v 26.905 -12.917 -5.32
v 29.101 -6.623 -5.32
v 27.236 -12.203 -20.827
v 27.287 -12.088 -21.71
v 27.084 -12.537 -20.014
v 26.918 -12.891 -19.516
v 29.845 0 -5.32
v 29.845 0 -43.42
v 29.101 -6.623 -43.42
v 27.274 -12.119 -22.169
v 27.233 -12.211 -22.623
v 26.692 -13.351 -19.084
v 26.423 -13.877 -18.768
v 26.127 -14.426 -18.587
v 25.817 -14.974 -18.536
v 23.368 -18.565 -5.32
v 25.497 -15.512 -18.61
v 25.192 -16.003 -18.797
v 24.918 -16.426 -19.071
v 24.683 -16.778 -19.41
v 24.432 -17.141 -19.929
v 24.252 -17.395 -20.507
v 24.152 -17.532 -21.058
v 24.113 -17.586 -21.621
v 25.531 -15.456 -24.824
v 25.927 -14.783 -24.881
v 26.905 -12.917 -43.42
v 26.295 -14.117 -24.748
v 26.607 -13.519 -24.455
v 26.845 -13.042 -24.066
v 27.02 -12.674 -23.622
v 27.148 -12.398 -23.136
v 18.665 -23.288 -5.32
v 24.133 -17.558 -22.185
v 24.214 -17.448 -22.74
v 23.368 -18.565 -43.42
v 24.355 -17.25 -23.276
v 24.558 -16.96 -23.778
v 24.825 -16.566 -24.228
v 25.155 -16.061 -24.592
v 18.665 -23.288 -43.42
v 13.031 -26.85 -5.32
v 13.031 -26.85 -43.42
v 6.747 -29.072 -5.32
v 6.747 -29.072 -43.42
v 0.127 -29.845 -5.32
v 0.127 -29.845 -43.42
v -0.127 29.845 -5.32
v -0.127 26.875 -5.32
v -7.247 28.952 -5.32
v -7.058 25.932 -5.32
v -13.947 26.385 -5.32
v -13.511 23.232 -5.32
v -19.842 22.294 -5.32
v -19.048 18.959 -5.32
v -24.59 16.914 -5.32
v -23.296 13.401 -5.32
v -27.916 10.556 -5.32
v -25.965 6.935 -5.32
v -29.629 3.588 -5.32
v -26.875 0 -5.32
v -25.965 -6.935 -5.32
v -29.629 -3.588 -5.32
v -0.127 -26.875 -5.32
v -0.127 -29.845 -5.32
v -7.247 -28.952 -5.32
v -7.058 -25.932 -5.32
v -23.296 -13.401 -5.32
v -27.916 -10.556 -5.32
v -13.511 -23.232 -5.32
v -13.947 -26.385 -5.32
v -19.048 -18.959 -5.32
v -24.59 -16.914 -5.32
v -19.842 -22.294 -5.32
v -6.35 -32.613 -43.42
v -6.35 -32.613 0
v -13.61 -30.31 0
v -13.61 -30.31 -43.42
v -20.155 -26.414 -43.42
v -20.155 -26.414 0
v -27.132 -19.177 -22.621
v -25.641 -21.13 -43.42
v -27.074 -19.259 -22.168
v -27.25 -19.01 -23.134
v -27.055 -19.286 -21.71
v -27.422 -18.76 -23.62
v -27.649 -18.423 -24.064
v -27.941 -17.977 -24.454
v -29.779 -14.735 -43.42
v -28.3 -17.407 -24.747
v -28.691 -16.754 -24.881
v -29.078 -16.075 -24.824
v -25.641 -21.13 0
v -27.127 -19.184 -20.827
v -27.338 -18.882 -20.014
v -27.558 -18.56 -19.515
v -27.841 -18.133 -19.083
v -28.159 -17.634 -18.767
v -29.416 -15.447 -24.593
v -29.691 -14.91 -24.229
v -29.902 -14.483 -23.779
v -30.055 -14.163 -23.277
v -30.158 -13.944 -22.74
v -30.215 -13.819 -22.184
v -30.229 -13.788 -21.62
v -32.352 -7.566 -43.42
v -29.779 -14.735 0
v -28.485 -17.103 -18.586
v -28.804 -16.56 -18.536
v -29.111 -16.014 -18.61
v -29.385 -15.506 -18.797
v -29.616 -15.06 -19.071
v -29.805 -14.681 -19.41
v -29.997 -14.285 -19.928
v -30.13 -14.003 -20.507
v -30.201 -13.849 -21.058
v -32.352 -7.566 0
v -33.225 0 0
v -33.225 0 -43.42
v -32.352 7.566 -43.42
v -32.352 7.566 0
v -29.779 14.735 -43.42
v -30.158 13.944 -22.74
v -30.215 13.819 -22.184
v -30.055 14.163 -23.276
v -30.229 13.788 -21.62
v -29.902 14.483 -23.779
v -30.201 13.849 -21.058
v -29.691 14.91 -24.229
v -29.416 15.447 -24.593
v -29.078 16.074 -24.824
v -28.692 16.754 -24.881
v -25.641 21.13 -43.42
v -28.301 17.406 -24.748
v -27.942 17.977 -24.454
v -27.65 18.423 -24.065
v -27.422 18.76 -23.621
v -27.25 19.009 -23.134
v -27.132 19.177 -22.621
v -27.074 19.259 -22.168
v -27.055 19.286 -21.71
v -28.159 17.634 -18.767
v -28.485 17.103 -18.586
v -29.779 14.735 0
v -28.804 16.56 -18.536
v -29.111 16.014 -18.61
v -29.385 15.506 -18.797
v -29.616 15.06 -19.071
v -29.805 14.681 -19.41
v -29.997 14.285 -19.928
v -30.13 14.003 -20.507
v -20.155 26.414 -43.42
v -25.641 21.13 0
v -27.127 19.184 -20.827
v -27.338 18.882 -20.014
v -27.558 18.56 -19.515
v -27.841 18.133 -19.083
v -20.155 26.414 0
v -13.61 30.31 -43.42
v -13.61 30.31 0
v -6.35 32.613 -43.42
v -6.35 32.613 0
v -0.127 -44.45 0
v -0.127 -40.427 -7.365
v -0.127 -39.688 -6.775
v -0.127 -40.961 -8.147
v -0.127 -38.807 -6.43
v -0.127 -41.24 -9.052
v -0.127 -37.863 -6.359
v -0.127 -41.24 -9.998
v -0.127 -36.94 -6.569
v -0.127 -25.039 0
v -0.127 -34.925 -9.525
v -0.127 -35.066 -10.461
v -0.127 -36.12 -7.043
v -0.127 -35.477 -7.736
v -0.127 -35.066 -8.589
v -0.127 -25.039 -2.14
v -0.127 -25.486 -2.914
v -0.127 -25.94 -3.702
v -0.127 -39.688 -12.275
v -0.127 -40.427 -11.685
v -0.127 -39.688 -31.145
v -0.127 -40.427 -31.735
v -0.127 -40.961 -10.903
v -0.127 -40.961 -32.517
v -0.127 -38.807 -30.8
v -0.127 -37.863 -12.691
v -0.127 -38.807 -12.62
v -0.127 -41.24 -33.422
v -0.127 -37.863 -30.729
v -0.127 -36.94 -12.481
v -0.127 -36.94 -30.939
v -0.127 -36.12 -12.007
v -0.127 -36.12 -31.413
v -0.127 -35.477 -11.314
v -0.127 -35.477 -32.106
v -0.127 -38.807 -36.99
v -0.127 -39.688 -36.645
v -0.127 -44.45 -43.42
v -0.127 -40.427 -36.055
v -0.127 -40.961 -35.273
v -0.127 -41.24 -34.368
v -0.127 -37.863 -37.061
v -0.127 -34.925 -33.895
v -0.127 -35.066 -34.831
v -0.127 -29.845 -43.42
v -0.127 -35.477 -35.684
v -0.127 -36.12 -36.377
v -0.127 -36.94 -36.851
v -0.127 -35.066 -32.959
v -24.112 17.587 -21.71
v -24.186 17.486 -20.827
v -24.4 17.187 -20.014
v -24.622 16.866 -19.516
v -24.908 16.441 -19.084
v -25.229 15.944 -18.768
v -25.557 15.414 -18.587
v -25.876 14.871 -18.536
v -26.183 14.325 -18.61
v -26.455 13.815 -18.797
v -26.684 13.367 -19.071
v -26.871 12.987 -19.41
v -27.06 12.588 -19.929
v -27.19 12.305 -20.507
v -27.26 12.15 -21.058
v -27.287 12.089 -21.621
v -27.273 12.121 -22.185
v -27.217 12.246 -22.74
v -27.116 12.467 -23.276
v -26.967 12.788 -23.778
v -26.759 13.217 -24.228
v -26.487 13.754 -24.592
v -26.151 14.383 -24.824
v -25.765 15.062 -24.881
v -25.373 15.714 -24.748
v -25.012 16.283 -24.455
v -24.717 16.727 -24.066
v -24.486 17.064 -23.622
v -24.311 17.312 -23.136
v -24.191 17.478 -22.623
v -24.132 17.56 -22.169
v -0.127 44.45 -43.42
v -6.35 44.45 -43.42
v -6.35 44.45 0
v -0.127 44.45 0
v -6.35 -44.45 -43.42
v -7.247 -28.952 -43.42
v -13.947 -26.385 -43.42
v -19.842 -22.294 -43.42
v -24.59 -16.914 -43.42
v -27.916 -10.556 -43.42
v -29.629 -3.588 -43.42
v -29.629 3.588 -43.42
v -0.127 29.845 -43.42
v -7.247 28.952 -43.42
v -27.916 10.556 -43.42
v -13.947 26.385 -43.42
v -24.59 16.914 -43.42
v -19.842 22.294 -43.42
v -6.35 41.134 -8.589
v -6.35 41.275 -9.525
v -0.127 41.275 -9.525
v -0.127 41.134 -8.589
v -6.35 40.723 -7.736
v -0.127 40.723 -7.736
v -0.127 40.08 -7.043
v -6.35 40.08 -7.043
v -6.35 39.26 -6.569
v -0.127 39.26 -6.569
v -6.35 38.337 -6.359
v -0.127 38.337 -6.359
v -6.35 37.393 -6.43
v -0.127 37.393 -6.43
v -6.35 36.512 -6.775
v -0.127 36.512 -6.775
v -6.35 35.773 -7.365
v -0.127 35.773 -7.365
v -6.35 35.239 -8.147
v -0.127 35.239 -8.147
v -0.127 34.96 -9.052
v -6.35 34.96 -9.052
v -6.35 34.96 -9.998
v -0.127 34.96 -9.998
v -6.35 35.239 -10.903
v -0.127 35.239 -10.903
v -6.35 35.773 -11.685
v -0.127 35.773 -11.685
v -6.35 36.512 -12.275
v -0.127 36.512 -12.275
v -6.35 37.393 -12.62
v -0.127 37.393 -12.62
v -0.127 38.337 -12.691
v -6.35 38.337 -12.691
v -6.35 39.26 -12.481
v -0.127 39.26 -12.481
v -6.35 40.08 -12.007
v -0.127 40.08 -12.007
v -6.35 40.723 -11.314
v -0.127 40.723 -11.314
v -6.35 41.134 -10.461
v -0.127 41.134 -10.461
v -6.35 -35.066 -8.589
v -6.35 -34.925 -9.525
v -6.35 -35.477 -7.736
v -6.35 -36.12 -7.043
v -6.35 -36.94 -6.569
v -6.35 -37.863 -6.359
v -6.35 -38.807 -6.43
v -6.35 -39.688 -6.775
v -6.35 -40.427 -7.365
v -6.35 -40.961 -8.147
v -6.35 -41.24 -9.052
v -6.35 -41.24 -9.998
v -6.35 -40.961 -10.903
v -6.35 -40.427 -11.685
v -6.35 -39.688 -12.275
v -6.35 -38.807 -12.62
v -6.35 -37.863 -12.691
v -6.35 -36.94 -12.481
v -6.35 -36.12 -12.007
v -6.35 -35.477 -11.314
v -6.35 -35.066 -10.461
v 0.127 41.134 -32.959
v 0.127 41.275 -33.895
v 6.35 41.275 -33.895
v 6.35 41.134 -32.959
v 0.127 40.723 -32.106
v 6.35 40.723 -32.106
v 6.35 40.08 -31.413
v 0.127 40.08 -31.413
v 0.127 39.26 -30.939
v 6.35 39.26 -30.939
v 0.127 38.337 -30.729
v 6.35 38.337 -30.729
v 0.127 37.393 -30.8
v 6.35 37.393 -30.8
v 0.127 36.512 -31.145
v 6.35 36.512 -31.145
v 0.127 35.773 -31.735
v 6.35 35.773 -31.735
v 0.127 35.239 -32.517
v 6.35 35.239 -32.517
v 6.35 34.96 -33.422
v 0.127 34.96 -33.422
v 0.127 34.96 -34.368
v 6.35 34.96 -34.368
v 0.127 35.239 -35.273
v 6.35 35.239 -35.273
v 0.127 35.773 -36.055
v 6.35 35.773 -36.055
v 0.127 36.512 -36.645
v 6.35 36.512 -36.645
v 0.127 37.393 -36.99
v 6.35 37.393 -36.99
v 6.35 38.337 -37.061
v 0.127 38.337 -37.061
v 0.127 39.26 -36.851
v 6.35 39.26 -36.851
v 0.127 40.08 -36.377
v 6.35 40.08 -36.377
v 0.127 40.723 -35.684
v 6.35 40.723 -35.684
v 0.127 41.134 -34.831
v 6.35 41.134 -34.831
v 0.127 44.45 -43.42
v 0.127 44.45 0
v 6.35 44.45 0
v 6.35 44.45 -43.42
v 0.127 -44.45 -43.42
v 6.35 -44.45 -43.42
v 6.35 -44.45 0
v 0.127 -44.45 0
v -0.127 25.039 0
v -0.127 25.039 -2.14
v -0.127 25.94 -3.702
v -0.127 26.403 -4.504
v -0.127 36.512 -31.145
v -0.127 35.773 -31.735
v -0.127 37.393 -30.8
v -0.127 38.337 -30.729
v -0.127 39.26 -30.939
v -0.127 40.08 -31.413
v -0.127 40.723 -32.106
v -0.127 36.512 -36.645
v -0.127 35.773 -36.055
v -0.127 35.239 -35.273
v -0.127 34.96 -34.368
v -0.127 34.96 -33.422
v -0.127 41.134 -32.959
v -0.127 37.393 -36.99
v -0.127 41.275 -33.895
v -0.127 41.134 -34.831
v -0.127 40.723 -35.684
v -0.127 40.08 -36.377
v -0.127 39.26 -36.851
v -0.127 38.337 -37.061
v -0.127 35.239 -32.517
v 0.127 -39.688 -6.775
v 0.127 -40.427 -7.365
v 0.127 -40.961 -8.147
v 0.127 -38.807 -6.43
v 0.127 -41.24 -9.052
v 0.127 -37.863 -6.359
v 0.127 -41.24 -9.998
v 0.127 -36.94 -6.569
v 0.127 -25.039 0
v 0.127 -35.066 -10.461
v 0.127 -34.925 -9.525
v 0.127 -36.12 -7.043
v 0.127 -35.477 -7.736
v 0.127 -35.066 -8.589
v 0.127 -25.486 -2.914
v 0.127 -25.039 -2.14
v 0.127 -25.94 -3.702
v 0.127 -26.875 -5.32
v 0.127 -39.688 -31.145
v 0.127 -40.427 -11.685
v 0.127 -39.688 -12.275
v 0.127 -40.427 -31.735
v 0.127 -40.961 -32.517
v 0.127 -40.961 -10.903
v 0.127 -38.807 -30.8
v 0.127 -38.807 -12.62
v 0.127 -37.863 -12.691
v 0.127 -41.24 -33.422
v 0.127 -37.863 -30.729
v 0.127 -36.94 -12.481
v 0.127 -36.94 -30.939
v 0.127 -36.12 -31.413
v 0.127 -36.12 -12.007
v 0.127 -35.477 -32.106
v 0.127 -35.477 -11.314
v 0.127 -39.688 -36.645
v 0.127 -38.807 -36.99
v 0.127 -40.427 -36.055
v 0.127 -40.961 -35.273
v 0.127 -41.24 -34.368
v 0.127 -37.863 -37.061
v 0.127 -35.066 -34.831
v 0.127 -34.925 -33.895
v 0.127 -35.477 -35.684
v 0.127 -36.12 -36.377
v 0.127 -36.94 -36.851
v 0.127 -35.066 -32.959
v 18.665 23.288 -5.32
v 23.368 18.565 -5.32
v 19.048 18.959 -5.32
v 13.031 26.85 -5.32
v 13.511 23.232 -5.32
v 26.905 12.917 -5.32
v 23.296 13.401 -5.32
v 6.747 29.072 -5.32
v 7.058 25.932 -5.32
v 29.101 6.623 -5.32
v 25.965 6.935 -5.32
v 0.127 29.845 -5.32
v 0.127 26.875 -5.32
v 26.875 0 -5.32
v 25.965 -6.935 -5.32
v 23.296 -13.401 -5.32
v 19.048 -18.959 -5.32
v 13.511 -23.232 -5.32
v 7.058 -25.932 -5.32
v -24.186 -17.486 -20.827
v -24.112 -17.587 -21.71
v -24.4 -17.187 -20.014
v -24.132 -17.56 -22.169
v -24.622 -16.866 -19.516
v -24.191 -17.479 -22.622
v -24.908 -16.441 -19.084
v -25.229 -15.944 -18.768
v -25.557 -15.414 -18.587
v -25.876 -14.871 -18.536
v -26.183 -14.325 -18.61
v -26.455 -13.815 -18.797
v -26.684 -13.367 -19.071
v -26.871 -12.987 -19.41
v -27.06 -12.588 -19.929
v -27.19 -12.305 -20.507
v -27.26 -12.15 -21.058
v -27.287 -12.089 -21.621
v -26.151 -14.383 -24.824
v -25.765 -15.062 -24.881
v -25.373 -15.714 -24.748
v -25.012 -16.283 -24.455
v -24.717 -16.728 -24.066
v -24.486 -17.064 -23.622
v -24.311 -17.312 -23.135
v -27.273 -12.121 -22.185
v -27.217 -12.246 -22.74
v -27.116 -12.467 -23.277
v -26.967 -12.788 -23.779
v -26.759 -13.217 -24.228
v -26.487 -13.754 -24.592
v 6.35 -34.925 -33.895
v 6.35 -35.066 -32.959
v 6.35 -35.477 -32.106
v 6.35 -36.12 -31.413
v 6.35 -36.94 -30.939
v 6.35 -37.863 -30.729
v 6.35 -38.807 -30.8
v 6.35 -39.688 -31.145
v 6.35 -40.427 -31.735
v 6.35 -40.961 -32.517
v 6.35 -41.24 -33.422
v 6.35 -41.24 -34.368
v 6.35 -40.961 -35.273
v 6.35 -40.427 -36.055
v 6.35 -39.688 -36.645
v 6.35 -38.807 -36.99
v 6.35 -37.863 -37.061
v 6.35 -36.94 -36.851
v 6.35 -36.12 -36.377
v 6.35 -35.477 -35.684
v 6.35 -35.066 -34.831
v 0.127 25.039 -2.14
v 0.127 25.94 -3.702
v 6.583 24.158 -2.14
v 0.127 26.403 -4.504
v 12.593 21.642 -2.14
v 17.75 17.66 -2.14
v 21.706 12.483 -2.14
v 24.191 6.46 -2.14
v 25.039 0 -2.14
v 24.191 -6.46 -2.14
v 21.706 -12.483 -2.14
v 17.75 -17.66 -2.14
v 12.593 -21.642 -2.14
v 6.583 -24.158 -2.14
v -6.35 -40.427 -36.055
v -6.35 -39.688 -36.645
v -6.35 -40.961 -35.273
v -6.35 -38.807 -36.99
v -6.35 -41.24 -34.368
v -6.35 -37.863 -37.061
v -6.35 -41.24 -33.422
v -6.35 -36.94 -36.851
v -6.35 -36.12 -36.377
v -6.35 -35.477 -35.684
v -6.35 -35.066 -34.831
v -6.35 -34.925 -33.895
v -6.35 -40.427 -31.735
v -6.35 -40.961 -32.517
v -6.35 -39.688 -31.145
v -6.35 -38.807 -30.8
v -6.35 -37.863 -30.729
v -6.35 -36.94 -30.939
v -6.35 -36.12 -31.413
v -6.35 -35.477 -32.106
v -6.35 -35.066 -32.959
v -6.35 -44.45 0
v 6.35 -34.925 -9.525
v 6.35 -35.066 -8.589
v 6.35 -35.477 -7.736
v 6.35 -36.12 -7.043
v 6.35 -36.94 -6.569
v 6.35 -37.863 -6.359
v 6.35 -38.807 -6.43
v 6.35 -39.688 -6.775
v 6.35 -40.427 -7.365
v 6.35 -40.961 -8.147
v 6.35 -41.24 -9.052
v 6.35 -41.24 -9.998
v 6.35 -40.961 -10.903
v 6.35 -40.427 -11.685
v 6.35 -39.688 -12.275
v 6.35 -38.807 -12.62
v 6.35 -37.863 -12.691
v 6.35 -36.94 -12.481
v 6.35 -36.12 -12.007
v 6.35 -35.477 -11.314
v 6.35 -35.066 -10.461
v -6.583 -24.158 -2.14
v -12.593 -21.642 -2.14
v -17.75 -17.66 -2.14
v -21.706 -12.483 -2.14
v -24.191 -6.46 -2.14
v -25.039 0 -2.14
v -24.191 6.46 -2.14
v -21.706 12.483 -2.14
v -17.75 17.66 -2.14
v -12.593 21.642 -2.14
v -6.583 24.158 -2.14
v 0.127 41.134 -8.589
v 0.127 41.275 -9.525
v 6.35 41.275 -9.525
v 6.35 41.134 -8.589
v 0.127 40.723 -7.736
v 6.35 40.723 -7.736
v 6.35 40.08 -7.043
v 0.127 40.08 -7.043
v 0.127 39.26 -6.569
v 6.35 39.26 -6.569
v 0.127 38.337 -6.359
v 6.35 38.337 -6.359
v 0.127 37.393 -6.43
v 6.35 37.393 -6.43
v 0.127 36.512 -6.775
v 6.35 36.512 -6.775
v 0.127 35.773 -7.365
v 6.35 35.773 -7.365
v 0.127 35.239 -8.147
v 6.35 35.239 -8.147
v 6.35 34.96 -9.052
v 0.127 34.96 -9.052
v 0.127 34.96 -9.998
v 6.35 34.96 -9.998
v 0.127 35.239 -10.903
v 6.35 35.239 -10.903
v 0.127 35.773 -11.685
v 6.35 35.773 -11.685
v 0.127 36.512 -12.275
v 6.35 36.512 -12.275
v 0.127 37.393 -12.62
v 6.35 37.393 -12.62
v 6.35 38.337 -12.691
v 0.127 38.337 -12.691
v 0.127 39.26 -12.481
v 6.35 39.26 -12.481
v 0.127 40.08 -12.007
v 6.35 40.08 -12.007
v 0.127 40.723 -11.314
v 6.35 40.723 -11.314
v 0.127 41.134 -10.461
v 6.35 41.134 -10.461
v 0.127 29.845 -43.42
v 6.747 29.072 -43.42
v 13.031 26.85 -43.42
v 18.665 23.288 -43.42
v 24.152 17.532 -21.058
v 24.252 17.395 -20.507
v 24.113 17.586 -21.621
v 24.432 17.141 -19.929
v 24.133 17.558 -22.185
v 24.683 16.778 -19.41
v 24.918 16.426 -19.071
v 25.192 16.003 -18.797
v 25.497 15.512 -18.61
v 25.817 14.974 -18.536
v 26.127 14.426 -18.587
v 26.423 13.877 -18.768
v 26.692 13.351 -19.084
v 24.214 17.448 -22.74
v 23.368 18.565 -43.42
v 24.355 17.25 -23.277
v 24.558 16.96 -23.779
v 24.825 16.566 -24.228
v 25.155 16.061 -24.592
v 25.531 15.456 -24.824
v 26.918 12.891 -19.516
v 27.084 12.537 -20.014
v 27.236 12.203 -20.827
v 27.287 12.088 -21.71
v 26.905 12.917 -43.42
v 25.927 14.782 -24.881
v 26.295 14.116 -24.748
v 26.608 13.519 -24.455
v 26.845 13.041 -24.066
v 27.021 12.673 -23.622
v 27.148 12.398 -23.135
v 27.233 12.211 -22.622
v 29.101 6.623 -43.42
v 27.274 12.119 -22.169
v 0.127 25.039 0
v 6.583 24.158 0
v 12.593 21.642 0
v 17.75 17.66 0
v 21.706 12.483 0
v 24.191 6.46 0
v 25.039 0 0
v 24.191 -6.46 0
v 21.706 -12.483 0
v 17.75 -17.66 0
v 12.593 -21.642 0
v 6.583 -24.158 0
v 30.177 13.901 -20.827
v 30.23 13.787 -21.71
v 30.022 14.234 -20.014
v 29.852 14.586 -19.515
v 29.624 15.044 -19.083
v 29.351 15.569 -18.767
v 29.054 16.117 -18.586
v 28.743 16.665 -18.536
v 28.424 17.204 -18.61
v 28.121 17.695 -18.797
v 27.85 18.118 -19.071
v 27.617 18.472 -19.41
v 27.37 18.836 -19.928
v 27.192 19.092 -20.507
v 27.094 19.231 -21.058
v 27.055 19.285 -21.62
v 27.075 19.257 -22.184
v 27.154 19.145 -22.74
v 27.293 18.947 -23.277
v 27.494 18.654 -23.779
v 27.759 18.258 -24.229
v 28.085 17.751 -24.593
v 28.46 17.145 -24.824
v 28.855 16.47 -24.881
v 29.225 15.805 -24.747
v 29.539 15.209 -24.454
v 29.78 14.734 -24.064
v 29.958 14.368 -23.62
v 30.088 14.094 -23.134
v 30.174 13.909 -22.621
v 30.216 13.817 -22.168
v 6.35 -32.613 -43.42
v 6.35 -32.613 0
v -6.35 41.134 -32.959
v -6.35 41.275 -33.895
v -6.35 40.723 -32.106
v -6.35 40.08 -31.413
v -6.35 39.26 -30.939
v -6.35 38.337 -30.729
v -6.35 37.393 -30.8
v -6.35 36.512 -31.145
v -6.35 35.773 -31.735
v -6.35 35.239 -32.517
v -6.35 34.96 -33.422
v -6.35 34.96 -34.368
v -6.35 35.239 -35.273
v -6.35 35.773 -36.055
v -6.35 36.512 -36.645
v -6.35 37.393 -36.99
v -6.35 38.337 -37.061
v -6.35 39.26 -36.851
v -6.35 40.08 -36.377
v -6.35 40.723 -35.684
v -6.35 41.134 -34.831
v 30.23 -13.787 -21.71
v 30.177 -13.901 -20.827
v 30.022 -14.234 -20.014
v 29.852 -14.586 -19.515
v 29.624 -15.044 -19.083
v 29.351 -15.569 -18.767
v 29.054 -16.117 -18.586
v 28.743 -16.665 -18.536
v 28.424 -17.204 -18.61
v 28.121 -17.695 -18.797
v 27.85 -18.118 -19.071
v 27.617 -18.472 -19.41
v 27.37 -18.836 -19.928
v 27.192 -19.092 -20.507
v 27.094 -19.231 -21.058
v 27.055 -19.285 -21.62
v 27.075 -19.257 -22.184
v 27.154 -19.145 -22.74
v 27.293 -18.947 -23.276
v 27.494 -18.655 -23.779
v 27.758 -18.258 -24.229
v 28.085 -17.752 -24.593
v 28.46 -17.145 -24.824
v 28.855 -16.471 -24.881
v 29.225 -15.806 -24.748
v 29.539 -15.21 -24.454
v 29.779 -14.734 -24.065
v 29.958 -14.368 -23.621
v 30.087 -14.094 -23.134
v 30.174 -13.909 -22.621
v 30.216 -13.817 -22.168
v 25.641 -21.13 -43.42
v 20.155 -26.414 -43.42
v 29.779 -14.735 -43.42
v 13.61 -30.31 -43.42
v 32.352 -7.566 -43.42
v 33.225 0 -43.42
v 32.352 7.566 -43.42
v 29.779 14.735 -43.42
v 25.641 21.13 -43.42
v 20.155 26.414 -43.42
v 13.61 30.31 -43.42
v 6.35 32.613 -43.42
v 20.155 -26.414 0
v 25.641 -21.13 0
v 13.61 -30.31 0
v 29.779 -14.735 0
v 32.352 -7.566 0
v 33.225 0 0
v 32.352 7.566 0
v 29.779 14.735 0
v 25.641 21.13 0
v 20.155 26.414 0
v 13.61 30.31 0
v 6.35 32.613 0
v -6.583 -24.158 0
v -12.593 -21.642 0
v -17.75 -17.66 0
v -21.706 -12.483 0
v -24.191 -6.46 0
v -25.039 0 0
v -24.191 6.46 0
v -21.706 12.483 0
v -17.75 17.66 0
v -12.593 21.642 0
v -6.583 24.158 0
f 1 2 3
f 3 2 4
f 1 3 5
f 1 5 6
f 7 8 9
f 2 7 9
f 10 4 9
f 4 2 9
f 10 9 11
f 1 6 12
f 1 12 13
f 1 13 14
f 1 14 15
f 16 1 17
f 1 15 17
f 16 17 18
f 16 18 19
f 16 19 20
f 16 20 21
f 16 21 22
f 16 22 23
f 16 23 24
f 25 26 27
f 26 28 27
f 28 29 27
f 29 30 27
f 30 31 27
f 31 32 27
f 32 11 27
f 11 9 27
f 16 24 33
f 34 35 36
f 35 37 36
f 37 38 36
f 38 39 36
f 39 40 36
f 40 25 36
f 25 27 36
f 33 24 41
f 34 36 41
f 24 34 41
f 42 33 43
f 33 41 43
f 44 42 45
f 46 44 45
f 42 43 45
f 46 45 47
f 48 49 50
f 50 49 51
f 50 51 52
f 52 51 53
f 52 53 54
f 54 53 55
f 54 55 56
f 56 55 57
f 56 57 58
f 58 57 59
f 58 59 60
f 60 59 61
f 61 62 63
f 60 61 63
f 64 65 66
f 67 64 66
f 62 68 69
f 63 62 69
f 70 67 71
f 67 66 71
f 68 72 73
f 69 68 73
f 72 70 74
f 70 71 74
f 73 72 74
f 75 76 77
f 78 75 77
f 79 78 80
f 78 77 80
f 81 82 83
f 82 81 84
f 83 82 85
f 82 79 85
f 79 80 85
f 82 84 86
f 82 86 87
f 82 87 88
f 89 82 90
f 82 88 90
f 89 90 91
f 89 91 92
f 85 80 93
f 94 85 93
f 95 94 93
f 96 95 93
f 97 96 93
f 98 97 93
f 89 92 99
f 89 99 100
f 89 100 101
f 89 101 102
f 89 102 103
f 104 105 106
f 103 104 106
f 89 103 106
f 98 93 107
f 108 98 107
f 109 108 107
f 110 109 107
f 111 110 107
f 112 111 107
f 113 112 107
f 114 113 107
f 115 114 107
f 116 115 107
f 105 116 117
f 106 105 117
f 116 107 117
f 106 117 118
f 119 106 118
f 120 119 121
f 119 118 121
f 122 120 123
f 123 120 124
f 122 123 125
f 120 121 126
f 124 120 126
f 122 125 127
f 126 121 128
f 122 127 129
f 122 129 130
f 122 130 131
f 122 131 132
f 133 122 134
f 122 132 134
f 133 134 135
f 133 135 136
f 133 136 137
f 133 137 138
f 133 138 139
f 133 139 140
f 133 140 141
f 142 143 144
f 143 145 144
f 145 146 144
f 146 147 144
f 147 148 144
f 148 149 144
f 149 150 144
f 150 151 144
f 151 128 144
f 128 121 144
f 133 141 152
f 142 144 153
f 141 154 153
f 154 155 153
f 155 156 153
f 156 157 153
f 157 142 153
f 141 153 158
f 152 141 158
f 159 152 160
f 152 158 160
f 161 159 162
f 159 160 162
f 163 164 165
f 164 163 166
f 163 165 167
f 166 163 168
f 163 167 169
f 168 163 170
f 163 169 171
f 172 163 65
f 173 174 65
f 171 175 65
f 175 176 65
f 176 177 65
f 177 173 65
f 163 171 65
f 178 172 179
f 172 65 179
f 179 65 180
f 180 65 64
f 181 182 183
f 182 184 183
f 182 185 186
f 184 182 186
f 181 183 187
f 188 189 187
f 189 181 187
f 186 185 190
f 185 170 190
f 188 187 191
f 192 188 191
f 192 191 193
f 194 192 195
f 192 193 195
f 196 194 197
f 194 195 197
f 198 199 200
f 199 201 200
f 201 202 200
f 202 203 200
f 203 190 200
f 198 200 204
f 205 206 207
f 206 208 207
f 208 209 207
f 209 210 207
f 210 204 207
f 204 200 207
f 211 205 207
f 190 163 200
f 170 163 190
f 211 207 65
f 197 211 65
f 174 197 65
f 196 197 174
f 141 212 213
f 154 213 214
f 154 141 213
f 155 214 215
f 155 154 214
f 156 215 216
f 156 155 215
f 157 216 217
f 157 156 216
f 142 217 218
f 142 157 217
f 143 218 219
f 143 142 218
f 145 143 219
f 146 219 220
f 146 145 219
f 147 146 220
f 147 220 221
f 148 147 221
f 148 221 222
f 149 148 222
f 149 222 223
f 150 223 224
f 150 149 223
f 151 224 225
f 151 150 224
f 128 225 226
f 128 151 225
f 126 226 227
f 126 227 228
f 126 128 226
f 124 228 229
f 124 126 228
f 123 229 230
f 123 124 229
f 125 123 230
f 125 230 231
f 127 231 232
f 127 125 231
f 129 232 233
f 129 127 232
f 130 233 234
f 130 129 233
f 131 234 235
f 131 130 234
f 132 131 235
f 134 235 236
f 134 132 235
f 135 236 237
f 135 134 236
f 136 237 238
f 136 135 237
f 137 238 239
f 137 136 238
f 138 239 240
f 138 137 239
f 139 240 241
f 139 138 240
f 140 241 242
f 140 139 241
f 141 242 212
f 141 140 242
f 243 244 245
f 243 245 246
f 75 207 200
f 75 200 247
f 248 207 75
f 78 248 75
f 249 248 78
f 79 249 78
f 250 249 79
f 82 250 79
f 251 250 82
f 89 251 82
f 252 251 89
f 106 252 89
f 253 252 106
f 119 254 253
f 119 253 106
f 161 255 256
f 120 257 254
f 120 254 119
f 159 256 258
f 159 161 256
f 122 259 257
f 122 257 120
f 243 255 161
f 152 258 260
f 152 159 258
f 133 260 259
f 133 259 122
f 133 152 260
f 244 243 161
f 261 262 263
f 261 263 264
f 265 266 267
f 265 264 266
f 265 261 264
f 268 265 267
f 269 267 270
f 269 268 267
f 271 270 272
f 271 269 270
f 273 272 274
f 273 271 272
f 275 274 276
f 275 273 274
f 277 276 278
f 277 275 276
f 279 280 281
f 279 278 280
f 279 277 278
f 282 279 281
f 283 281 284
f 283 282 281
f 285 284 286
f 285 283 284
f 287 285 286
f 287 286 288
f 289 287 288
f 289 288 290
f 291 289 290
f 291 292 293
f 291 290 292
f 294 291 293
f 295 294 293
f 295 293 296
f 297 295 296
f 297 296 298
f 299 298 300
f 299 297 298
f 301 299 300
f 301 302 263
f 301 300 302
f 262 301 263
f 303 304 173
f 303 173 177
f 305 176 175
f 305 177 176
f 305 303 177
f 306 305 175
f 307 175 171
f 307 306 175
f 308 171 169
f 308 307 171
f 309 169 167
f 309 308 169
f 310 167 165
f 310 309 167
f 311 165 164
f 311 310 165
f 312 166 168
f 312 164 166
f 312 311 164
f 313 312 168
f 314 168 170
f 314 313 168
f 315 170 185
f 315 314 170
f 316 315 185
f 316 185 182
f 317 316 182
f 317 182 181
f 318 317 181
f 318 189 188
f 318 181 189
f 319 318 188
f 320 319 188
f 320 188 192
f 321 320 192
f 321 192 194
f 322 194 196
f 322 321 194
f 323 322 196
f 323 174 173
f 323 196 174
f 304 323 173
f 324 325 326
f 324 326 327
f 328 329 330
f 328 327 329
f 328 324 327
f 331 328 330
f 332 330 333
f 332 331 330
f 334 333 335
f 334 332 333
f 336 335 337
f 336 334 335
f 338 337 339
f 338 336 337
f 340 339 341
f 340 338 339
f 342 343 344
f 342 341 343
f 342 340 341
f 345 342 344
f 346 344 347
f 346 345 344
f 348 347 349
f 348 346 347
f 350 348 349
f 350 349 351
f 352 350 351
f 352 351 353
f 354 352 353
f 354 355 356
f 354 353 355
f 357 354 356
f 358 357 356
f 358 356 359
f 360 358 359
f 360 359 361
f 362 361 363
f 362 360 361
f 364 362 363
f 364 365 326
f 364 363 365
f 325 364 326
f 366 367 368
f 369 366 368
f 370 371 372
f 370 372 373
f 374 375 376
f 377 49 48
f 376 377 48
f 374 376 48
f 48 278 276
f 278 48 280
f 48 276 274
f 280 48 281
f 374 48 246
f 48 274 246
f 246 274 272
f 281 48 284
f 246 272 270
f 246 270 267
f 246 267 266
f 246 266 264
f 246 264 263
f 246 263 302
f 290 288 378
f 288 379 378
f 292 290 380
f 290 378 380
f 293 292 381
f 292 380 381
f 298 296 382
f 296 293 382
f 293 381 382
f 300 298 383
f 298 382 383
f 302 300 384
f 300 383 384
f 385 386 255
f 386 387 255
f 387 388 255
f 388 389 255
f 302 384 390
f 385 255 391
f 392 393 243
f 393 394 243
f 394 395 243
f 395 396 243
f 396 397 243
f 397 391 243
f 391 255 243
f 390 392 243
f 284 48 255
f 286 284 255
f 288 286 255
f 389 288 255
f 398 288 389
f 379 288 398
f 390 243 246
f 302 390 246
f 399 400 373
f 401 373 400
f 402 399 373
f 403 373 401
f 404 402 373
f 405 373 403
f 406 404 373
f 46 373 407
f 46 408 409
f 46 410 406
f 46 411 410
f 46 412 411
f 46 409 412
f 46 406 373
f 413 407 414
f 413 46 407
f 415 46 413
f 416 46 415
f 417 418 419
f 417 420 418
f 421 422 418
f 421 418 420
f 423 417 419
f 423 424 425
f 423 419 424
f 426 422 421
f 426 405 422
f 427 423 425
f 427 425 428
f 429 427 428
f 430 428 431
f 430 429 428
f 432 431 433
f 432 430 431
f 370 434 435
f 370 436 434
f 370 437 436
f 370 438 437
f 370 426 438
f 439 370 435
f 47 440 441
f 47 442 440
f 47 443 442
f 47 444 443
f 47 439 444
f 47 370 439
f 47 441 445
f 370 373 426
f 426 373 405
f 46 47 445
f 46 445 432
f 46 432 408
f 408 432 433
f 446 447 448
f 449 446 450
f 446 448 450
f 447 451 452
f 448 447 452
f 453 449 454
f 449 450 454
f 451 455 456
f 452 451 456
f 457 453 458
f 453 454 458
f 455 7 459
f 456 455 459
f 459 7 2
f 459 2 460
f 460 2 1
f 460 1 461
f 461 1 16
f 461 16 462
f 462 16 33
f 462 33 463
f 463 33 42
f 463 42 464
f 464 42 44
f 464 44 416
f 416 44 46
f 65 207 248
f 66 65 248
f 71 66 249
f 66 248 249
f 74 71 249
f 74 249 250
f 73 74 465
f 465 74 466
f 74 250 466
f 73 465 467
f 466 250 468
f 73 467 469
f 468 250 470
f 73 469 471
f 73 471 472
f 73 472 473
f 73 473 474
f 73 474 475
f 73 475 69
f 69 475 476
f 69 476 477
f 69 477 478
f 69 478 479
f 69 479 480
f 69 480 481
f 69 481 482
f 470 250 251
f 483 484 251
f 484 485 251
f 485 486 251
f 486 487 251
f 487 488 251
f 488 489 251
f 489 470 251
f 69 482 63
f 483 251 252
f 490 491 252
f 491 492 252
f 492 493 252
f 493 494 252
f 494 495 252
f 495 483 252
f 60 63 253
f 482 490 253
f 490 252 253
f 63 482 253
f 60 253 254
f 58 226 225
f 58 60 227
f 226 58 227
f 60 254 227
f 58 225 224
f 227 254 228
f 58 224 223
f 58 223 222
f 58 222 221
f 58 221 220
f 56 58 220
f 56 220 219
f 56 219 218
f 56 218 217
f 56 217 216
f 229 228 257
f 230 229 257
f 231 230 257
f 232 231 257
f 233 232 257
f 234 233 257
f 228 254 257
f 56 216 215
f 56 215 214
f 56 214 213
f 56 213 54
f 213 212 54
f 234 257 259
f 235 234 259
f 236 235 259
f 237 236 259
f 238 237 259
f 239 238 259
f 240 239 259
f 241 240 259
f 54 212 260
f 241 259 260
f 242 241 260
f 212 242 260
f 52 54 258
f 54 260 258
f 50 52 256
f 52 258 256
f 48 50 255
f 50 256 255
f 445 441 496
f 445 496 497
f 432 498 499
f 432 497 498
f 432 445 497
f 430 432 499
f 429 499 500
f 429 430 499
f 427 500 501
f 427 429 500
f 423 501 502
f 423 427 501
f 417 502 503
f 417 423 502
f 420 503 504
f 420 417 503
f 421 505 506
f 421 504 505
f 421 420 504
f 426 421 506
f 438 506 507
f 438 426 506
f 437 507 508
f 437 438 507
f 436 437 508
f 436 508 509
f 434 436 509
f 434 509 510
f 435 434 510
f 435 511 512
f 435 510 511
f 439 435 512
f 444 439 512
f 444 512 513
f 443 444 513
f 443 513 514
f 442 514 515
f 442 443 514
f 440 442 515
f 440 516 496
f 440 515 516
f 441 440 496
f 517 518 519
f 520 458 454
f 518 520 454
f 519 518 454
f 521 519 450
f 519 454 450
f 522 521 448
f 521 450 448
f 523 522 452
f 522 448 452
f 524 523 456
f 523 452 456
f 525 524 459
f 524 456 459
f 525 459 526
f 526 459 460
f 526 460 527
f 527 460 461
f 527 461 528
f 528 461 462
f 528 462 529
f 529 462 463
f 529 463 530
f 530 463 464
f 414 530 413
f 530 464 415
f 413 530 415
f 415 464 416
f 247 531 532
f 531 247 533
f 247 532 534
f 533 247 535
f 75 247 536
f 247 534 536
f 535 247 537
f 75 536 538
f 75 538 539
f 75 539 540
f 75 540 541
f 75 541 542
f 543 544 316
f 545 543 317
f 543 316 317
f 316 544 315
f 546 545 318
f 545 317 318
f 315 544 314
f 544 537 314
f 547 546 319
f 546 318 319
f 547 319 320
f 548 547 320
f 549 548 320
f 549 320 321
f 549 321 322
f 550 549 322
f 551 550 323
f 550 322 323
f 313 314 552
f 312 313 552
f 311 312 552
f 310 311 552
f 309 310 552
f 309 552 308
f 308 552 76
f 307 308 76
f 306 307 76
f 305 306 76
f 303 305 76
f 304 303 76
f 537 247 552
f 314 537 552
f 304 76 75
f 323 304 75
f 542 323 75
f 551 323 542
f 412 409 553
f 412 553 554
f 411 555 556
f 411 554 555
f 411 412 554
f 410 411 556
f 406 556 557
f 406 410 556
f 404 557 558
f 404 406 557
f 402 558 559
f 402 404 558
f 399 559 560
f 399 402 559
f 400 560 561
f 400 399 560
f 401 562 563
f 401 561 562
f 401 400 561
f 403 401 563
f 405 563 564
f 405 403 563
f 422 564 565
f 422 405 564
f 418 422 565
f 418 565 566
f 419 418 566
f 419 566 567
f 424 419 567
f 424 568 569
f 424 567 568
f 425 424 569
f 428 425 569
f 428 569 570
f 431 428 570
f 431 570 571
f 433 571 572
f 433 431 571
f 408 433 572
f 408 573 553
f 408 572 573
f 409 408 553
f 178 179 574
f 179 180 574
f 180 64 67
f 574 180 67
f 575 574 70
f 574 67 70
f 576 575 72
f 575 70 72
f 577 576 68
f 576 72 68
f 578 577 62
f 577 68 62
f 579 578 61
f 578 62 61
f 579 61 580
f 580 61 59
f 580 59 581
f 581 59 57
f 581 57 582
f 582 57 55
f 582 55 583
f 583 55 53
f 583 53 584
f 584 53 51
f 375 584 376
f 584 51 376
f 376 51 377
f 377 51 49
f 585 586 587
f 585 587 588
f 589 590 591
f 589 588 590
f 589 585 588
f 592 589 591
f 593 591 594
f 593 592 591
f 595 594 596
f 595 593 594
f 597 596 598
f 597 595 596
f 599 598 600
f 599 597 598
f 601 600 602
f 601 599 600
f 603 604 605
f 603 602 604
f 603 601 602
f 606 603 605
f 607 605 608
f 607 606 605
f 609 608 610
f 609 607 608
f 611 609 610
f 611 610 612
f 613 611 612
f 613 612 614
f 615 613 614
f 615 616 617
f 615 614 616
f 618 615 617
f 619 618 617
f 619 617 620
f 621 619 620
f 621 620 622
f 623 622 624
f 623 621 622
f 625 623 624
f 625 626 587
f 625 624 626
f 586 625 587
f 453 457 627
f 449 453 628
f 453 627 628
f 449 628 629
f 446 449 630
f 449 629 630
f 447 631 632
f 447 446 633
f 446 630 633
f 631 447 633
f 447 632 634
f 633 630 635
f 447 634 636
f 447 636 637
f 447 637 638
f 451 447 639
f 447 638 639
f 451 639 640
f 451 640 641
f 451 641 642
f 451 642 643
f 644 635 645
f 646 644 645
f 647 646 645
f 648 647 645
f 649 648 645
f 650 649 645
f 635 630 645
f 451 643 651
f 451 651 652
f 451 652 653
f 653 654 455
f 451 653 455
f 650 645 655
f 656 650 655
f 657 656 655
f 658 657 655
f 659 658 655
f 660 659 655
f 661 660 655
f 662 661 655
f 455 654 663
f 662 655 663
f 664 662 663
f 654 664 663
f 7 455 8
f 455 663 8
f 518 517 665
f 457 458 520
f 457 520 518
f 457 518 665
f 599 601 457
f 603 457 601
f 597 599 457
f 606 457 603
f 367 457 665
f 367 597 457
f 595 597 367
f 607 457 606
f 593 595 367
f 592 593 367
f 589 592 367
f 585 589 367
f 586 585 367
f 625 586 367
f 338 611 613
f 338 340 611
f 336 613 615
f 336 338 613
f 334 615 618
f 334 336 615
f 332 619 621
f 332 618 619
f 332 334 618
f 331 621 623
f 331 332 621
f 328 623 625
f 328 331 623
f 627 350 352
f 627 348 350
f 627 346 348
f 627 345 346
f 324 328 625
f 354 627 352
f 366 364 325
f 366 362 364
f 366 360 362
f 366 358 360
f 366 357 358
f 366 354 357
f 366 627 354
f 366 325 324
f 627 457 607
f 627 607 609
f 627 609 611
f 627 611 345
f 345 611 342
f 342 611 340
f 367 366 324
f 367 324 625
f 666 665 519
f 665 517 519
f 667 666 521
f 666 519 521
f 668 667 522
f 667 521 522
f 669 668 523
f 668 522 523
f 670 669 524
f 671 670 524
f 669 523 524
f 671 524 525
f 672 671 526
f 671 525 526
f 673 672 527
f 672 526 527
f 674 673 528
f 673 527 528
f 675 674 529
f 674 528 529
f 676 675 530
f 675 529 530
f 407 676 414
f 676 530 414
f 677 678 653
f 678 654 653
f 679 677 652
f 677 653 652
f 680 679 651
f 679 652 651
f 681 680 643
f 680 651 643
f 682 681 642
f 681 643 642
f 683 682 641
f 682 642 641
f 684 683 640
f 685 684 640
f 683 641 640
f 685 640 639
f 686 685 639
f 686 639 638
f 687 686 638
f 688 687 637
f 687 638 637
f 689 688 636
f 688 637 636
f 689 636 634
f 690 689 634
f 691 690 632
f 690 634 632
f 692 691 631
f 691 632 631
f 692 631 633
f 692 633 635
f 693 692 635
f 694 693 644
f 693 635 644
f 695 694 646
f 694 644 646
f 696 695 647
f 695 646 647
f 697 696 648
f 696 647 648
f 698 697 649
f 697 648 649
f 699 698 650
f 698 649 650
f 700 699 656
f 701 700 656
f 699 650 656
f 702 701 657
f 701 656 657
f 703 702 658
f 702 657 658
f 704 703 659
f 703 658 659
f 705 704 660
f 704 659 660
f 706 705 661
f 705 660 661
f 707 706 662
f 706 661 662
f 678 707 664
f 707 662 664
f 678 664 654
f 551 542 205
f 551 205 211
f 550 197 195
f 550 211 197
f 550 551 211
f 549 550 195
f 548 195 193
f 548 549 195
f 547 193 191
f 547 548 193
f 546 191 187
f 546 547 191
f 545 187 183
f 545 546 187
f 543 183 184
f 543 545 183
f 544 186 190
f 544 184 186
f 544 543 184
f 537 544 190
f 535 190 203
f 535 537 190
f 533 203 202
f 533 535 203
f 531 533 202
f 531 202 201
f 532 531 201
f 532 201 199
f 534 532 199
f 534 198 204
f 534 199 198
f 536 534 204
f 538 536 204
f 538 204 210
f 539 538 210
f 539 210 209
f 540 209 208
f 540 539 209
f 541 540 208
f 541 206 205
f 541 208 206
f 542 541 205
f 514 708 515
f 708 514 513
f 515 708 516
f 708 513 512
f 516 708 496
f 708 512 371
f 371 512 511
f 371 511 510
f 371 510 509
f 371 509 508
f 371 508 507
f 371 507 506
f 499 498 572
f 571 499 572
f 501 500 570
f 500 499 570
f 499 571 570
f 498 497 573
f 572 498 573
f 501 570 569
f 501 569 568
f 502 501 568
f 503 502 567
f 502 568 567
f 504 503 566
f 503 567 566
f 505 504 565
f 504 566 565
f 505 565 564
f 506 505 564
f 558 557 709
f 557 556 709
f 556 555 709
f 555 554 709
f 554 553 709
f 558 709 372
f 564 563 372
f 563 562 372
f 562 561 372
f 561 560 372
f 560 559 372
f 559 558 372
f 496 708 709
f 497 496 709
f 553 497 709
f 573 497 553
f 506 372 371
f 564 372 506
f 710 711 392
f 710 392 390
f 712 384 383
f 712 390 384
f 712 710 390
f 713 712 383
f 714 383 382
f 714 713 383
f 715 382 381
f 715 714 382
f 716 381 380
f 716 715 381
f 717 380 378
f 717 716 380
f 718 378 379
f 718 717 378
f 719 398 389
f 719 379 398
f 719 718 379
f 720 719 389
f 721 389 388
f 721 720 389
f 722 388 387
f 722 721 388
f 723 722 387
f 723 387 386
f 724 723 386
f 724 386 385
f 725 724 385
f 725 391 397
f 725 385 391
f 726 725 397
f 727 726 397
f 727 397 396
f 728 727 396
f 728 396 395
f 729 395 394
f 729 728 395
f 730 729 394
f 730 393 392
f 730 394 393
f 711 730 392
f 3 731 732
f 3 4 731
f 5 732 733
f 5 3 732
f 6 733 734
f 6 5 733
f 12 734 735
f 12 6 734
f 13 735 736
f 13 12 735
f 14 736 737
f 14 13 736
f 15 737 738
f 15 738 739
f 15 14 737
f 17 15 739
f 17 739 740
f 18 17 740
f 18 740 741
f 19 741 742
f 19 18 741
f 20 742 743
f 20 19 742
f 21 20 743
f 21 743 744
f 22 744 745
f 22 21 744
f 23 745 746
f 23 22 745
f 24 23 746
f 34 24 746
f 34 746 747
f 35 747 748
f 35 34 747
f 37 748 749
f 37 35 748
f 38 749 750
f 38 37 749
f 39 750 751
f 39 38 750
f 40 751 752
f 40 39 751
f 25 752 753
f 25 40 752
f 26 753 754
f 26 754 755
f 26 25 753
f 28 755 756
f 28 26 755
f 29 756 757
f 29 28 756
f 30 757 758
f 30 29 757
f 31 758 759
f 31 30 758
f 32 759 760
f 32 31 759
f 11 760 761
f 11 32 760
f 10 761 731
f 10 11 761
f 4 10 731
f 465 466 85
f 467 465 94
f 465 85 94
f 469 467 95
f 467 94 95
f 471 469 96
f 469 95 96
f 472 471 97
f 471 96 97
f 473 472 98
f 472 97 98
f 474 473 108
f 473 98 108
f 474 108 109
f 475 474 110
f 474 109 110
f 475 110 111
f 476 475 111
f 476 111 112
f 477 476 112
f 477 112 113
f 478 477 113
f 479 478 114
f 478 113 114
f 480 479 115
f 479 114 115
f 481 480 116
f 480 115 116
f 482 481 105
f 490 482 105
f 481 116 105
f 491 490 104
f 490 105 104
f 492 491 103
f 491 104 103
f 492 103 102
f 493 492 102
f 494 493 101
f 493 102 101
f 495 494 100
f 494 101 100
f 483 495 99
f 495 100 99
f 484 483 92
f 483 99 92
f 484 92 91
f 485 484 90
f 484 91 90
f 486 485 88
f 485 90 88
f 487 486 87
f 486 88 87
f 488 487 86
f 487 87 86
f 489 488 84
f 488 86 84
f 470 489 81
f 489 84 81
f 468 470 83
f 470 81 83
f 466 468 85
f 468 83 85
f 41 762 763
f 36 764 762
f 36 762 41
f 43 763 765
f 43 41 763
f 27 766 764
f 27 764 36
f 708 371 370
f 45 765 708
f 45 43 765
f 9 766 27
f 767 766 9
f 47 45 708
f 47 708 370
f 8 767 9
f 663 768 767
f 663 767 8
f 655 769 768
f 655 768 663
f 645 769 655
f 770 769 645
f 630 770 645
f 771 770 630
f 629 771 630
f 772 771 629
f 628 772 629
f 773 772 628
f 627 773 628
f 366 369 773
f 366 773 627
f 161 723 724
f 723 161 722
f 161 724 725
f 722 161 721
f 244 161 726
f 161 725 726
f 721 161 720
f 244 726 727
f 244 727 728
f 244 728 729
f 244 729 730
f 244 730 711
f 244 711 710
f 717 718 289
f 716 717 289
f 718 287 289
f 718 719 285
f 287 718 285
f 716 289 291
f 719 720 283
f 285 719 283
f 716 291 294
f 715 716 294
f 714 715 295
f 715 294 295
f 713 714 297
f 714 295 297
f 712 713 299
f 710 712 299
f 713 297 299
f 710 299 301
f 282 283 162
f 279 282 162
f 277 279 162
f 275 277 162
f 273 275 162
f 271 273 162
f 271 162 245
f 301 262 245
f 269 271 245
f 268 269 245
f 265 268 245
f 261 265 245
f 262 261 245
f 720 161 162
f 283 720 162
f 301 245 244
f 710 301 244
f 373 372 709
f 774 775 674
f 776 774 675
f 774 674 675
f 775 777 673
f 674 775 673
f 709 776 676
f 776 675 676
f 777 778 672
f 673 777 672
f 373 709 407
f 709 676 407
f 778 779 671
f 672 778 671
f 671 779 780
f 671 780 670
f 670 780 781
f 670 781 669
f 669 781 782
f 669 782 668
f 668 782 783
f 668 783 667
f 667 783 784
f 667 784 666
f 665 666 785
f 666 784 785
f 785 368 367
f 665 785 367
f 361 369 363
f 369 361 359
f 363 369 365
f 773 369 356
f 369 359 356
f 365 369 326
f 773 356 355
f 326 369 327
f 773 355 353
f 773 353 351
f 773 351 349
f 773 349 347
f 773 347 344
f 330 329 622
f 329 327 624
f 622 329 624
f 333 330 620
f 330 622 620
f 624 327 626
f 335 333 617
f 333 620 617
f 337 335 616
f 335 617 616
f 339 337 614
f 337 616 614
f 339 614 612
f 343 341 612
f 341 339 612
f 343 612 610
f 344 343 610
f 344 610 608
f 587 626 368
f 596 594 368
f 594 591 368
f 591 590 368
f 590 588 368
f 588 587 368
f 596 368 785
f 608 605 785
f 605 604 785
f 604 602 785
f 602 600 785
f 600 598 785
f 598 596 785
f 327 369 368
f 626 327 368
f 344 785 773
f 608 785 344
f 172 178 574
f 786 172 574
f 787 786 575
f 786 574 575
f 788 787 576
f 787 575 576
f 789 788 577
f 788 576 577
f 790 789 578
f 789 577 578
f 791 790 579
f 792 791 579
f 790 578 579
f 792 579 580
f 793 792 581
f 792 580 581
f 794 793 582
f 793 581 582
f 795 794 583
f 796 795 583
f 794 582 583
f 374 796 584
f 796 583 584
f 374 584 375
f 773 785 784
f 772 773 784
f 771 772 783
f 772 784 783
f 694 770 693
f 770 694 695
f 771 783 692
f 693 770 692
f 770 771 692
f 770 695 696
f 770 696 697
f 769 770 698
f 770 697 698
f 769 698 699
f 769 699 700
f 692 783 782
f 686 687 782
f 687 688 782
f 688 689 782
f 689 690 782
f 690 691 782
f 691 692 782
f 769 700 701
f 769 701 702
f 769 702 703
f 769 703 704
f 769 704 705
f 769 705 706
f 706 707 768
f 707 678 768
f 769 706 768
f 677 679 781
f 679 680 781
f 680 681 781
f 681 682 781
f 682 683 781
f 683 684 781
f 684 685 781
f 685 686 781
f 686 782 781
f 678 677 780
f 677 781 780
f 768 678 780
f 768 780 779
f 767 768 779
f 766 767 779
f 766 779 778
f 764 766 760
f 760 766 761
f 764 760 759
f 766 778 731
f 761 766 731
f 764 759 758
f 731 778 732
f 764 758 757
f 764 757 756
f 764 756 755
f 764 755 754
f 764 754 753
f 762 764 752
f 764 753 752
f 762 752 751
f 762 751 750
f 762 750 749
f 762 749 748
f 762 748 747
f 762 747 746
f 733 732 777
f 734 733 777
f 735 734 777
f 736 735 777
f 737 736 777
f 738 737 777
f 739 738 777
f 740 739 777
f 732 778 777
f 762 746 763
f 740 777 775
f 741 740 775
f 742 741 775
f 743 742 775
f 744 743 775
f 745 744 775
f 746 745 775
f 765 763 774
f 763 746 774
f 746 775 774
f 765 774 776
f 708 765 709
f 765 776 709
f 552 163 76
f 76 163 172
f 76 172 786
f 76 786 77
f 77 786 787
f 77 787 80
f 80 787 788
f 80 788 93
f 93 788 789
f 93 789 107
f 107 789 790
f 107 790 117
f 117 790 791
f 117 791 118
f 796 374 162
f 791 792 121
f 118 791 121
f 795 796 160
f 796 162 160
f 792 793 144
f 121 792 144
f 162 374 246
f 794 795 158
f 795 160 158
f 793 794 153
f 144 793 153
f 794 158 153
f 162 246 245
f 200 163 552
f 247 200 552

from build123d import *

# Parameters (mm, degrees)
SKETCH8_W                = 3.38
SKETCH8_H                = 38.1
BOSS_EXTRUDE10_DEPTH     = 43.42
CUT_EXTRUDE7_DEPTH       = 71.462752749
CUT_EXTRUDE7_DEPTH_BACK  = 71.462752749
SKETCH18_R               = 3.175
SKETCH23_R               = 3.175
CUT_EXTRUDE9_DEPTH       = 71.462752749
CUT_EXTRUDE11_DEPTH      = 71.462752858
CUT_EXTRUDE11_DEPTH_BACK = 71.462752858
SKETCH25_W               = 0.254
SKETCH25_H               = 127


with BuildPart() as part:
    # Sketch2 → Revolve1 (revolve)
    with BuildSketch(Plane(origin=(0, 0, 0), x_dir=(1, 0, 0), z_dir=(0, 1, 0))):
        Polygon((25.039026144, 0), (25.039026144, 2.14), (26.875, 5.32), (33.225, 5.32), (33.225, 0), align=None)
    revolve(axis=Axis((0, 0, 0), (0, 0, -1)))

    # Sketch8 → Revolve2 (revolve)
    with BuildSketch(Plane(origin=(0, 0, 0), x_dir=(1, 0, 0), z_dir=(0, 1, 0)), mode=Mode.PRIVATE) as revolve2_sk:
        with Locations((-31.535, 24.37)):
            Rectangle(SKETCH8_W, SKETCH8_H)
    revolve(revolve2_sk.sketch.rotate(Axis((0, 0, 0), (0, 0, -1)), 180), axis=Axis((0, 0, 0), (0, 0, -1)))

    # Sketch19 → Boss-Extrude10 (add)
    with BuildSketch(Plane.XY):
        with BuildLine():
            Line((-6.35, 32.612545515), (-6.35, 44.45))
            Line((-6.35, 44.45), (6.35, 44.45))
            Line((6.35, 44.45), (6.35, 32.612545515))
            ThreePointArc((6.35, 32.612545515), (0, 33.225), (-6.35, 32.612545515))
        make_face()
        with BuildLine():
            Line((6.35, -44.45), (-6.35, -44.45))
            Line((-6.35, -44.45), (-6.35, -32.612545515))
            ThreePointArc((-6.35, -32.612545515), (0, -33.225), (6.35, -32.612545515))
            Line((6.35, -32.612545515), (6.35, -44.45))
        make_face()
    extrude(amount=-BOSS_EXTRUDE10_DEPTH)

    # Sketch18 → Cut-Extrude7 (cut, two sides: drawn at the far end of the back side and taken through both)
    with BuildSketch(Plane(origin=(0, 0, 0), x_dir=(0, 0, -1), z_dir=(1, 0, 0)).offset(-CUT_EXTRUDE7_DEPTH_BACK)):
        with Locations(Location((9.525, 38.1, 0), (0, 0, 90))):
            Circle(SKETCH18_R)
        with Locations(Location((33.895, 38.1, 0), (0, 0, 90))):
            Circle(SKETCH18_R)
        with Locations(Location((9.525, -38.1, 0), (0, 0, 90))):
            Circle(SKETCH18_R)
        with Locations(Location((33.895, -38.1, 0), (0, 0, 90))):
            Circle(SKETCH18_R)
    extrude(amount=CUT_EXTRUDE7_DEPTH + CUT_EXTRUDE7_DEPTH_BACK, mode=Mode.SUBTRACT)

    # Sketch23 → Cut-Extrude9 (cut, symmetric)
    with BuildSketch(Plane(origin=(0, 0, 0), x_dir=(-0.5000000000000014, 0.8660254037844378, 0), z_dir=(-0.8660254037844378, -0.5000000000000014, 0))):
        with Locations(Location((0, 21.71, 0), (0, 0, 180))):
            Circle(SKETCH23_R)
    cut_extrude9 = extrude(amount=CUT_EXTRUDE9_DEPTH, both=True, mode=Mode.SUBTRACT)

    # Mirror3: Cut-Extrude9 across plane
    add(cut_extrude9.mirror(Plane.ZX), mode=Mode.SUBTRACT)

    # Sketch25 → Cut-Extrude11 (cut, two sides: drawn at the far end of the back side and taken through both)
    with BuildSketch(Plane.XY.offset(-CUT_EXTRUDE11_DEPTH_BACK)):
        Rectangle(SKETCH25_W, SKETCH25_H)
    extrude(amount=CUT_EXTRUDE11_DEPTH + CUT_EXTRUDE11_DEPTH_BACK, mode=Mode.SUBTRACT)


with BuildPart() as cut_extrude11_piece_1:
    # of the separate pieces the step leaves, piece 1, a body of its own (cut_extrude11_pieces)
    add(part.part.solids().sort_by_distance((-0.127, -25.038704065, 0))[0])


with BuildPart() as cut_extrude11_piece_2:
    # of the separate pieces the step leaves, piece 2, a body of its own (cut_extrude11_pieces)
    add(part.part.solids().sort_by_distance((0.127, 25.038704065, -2.14))[0])


solid = Compound([cut_extrude11_piece_1.part, cut_extrude11_piece_2.part])
